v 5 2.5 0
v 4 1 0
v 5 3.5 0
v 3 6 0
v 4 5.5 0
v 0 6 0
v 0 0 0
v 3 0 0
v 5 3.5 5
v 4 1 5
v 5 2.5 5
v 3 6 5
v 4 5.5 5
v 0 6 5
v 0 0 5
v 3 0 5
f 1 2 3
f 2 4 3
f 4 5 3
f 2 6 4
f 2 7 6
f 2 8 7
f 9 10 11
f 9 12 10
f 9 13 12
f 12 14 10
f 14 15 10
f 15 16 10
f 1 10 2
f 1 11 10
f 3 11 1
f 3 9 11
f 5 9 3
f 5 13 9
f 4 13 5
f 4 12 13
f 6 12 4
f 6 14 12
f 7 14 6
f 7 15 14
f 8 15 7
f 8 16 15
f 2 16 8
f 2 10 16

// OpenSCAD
//=============================================================================
// Icon used for the Profile Tool.
// =============================================================================

module ProfileIcon () {
     w = 3;
     points = [
          [0, 0],
          [w, 0],
          [w+1, 1],
          [w+2, 2.5],
          [w+2, 3.5],
          [w+1, 5.5],
          [w, 6],
          [0, 6],
     ];
     linear_extrude(height = 5) polygon(points);
}

ProfileIcon();
